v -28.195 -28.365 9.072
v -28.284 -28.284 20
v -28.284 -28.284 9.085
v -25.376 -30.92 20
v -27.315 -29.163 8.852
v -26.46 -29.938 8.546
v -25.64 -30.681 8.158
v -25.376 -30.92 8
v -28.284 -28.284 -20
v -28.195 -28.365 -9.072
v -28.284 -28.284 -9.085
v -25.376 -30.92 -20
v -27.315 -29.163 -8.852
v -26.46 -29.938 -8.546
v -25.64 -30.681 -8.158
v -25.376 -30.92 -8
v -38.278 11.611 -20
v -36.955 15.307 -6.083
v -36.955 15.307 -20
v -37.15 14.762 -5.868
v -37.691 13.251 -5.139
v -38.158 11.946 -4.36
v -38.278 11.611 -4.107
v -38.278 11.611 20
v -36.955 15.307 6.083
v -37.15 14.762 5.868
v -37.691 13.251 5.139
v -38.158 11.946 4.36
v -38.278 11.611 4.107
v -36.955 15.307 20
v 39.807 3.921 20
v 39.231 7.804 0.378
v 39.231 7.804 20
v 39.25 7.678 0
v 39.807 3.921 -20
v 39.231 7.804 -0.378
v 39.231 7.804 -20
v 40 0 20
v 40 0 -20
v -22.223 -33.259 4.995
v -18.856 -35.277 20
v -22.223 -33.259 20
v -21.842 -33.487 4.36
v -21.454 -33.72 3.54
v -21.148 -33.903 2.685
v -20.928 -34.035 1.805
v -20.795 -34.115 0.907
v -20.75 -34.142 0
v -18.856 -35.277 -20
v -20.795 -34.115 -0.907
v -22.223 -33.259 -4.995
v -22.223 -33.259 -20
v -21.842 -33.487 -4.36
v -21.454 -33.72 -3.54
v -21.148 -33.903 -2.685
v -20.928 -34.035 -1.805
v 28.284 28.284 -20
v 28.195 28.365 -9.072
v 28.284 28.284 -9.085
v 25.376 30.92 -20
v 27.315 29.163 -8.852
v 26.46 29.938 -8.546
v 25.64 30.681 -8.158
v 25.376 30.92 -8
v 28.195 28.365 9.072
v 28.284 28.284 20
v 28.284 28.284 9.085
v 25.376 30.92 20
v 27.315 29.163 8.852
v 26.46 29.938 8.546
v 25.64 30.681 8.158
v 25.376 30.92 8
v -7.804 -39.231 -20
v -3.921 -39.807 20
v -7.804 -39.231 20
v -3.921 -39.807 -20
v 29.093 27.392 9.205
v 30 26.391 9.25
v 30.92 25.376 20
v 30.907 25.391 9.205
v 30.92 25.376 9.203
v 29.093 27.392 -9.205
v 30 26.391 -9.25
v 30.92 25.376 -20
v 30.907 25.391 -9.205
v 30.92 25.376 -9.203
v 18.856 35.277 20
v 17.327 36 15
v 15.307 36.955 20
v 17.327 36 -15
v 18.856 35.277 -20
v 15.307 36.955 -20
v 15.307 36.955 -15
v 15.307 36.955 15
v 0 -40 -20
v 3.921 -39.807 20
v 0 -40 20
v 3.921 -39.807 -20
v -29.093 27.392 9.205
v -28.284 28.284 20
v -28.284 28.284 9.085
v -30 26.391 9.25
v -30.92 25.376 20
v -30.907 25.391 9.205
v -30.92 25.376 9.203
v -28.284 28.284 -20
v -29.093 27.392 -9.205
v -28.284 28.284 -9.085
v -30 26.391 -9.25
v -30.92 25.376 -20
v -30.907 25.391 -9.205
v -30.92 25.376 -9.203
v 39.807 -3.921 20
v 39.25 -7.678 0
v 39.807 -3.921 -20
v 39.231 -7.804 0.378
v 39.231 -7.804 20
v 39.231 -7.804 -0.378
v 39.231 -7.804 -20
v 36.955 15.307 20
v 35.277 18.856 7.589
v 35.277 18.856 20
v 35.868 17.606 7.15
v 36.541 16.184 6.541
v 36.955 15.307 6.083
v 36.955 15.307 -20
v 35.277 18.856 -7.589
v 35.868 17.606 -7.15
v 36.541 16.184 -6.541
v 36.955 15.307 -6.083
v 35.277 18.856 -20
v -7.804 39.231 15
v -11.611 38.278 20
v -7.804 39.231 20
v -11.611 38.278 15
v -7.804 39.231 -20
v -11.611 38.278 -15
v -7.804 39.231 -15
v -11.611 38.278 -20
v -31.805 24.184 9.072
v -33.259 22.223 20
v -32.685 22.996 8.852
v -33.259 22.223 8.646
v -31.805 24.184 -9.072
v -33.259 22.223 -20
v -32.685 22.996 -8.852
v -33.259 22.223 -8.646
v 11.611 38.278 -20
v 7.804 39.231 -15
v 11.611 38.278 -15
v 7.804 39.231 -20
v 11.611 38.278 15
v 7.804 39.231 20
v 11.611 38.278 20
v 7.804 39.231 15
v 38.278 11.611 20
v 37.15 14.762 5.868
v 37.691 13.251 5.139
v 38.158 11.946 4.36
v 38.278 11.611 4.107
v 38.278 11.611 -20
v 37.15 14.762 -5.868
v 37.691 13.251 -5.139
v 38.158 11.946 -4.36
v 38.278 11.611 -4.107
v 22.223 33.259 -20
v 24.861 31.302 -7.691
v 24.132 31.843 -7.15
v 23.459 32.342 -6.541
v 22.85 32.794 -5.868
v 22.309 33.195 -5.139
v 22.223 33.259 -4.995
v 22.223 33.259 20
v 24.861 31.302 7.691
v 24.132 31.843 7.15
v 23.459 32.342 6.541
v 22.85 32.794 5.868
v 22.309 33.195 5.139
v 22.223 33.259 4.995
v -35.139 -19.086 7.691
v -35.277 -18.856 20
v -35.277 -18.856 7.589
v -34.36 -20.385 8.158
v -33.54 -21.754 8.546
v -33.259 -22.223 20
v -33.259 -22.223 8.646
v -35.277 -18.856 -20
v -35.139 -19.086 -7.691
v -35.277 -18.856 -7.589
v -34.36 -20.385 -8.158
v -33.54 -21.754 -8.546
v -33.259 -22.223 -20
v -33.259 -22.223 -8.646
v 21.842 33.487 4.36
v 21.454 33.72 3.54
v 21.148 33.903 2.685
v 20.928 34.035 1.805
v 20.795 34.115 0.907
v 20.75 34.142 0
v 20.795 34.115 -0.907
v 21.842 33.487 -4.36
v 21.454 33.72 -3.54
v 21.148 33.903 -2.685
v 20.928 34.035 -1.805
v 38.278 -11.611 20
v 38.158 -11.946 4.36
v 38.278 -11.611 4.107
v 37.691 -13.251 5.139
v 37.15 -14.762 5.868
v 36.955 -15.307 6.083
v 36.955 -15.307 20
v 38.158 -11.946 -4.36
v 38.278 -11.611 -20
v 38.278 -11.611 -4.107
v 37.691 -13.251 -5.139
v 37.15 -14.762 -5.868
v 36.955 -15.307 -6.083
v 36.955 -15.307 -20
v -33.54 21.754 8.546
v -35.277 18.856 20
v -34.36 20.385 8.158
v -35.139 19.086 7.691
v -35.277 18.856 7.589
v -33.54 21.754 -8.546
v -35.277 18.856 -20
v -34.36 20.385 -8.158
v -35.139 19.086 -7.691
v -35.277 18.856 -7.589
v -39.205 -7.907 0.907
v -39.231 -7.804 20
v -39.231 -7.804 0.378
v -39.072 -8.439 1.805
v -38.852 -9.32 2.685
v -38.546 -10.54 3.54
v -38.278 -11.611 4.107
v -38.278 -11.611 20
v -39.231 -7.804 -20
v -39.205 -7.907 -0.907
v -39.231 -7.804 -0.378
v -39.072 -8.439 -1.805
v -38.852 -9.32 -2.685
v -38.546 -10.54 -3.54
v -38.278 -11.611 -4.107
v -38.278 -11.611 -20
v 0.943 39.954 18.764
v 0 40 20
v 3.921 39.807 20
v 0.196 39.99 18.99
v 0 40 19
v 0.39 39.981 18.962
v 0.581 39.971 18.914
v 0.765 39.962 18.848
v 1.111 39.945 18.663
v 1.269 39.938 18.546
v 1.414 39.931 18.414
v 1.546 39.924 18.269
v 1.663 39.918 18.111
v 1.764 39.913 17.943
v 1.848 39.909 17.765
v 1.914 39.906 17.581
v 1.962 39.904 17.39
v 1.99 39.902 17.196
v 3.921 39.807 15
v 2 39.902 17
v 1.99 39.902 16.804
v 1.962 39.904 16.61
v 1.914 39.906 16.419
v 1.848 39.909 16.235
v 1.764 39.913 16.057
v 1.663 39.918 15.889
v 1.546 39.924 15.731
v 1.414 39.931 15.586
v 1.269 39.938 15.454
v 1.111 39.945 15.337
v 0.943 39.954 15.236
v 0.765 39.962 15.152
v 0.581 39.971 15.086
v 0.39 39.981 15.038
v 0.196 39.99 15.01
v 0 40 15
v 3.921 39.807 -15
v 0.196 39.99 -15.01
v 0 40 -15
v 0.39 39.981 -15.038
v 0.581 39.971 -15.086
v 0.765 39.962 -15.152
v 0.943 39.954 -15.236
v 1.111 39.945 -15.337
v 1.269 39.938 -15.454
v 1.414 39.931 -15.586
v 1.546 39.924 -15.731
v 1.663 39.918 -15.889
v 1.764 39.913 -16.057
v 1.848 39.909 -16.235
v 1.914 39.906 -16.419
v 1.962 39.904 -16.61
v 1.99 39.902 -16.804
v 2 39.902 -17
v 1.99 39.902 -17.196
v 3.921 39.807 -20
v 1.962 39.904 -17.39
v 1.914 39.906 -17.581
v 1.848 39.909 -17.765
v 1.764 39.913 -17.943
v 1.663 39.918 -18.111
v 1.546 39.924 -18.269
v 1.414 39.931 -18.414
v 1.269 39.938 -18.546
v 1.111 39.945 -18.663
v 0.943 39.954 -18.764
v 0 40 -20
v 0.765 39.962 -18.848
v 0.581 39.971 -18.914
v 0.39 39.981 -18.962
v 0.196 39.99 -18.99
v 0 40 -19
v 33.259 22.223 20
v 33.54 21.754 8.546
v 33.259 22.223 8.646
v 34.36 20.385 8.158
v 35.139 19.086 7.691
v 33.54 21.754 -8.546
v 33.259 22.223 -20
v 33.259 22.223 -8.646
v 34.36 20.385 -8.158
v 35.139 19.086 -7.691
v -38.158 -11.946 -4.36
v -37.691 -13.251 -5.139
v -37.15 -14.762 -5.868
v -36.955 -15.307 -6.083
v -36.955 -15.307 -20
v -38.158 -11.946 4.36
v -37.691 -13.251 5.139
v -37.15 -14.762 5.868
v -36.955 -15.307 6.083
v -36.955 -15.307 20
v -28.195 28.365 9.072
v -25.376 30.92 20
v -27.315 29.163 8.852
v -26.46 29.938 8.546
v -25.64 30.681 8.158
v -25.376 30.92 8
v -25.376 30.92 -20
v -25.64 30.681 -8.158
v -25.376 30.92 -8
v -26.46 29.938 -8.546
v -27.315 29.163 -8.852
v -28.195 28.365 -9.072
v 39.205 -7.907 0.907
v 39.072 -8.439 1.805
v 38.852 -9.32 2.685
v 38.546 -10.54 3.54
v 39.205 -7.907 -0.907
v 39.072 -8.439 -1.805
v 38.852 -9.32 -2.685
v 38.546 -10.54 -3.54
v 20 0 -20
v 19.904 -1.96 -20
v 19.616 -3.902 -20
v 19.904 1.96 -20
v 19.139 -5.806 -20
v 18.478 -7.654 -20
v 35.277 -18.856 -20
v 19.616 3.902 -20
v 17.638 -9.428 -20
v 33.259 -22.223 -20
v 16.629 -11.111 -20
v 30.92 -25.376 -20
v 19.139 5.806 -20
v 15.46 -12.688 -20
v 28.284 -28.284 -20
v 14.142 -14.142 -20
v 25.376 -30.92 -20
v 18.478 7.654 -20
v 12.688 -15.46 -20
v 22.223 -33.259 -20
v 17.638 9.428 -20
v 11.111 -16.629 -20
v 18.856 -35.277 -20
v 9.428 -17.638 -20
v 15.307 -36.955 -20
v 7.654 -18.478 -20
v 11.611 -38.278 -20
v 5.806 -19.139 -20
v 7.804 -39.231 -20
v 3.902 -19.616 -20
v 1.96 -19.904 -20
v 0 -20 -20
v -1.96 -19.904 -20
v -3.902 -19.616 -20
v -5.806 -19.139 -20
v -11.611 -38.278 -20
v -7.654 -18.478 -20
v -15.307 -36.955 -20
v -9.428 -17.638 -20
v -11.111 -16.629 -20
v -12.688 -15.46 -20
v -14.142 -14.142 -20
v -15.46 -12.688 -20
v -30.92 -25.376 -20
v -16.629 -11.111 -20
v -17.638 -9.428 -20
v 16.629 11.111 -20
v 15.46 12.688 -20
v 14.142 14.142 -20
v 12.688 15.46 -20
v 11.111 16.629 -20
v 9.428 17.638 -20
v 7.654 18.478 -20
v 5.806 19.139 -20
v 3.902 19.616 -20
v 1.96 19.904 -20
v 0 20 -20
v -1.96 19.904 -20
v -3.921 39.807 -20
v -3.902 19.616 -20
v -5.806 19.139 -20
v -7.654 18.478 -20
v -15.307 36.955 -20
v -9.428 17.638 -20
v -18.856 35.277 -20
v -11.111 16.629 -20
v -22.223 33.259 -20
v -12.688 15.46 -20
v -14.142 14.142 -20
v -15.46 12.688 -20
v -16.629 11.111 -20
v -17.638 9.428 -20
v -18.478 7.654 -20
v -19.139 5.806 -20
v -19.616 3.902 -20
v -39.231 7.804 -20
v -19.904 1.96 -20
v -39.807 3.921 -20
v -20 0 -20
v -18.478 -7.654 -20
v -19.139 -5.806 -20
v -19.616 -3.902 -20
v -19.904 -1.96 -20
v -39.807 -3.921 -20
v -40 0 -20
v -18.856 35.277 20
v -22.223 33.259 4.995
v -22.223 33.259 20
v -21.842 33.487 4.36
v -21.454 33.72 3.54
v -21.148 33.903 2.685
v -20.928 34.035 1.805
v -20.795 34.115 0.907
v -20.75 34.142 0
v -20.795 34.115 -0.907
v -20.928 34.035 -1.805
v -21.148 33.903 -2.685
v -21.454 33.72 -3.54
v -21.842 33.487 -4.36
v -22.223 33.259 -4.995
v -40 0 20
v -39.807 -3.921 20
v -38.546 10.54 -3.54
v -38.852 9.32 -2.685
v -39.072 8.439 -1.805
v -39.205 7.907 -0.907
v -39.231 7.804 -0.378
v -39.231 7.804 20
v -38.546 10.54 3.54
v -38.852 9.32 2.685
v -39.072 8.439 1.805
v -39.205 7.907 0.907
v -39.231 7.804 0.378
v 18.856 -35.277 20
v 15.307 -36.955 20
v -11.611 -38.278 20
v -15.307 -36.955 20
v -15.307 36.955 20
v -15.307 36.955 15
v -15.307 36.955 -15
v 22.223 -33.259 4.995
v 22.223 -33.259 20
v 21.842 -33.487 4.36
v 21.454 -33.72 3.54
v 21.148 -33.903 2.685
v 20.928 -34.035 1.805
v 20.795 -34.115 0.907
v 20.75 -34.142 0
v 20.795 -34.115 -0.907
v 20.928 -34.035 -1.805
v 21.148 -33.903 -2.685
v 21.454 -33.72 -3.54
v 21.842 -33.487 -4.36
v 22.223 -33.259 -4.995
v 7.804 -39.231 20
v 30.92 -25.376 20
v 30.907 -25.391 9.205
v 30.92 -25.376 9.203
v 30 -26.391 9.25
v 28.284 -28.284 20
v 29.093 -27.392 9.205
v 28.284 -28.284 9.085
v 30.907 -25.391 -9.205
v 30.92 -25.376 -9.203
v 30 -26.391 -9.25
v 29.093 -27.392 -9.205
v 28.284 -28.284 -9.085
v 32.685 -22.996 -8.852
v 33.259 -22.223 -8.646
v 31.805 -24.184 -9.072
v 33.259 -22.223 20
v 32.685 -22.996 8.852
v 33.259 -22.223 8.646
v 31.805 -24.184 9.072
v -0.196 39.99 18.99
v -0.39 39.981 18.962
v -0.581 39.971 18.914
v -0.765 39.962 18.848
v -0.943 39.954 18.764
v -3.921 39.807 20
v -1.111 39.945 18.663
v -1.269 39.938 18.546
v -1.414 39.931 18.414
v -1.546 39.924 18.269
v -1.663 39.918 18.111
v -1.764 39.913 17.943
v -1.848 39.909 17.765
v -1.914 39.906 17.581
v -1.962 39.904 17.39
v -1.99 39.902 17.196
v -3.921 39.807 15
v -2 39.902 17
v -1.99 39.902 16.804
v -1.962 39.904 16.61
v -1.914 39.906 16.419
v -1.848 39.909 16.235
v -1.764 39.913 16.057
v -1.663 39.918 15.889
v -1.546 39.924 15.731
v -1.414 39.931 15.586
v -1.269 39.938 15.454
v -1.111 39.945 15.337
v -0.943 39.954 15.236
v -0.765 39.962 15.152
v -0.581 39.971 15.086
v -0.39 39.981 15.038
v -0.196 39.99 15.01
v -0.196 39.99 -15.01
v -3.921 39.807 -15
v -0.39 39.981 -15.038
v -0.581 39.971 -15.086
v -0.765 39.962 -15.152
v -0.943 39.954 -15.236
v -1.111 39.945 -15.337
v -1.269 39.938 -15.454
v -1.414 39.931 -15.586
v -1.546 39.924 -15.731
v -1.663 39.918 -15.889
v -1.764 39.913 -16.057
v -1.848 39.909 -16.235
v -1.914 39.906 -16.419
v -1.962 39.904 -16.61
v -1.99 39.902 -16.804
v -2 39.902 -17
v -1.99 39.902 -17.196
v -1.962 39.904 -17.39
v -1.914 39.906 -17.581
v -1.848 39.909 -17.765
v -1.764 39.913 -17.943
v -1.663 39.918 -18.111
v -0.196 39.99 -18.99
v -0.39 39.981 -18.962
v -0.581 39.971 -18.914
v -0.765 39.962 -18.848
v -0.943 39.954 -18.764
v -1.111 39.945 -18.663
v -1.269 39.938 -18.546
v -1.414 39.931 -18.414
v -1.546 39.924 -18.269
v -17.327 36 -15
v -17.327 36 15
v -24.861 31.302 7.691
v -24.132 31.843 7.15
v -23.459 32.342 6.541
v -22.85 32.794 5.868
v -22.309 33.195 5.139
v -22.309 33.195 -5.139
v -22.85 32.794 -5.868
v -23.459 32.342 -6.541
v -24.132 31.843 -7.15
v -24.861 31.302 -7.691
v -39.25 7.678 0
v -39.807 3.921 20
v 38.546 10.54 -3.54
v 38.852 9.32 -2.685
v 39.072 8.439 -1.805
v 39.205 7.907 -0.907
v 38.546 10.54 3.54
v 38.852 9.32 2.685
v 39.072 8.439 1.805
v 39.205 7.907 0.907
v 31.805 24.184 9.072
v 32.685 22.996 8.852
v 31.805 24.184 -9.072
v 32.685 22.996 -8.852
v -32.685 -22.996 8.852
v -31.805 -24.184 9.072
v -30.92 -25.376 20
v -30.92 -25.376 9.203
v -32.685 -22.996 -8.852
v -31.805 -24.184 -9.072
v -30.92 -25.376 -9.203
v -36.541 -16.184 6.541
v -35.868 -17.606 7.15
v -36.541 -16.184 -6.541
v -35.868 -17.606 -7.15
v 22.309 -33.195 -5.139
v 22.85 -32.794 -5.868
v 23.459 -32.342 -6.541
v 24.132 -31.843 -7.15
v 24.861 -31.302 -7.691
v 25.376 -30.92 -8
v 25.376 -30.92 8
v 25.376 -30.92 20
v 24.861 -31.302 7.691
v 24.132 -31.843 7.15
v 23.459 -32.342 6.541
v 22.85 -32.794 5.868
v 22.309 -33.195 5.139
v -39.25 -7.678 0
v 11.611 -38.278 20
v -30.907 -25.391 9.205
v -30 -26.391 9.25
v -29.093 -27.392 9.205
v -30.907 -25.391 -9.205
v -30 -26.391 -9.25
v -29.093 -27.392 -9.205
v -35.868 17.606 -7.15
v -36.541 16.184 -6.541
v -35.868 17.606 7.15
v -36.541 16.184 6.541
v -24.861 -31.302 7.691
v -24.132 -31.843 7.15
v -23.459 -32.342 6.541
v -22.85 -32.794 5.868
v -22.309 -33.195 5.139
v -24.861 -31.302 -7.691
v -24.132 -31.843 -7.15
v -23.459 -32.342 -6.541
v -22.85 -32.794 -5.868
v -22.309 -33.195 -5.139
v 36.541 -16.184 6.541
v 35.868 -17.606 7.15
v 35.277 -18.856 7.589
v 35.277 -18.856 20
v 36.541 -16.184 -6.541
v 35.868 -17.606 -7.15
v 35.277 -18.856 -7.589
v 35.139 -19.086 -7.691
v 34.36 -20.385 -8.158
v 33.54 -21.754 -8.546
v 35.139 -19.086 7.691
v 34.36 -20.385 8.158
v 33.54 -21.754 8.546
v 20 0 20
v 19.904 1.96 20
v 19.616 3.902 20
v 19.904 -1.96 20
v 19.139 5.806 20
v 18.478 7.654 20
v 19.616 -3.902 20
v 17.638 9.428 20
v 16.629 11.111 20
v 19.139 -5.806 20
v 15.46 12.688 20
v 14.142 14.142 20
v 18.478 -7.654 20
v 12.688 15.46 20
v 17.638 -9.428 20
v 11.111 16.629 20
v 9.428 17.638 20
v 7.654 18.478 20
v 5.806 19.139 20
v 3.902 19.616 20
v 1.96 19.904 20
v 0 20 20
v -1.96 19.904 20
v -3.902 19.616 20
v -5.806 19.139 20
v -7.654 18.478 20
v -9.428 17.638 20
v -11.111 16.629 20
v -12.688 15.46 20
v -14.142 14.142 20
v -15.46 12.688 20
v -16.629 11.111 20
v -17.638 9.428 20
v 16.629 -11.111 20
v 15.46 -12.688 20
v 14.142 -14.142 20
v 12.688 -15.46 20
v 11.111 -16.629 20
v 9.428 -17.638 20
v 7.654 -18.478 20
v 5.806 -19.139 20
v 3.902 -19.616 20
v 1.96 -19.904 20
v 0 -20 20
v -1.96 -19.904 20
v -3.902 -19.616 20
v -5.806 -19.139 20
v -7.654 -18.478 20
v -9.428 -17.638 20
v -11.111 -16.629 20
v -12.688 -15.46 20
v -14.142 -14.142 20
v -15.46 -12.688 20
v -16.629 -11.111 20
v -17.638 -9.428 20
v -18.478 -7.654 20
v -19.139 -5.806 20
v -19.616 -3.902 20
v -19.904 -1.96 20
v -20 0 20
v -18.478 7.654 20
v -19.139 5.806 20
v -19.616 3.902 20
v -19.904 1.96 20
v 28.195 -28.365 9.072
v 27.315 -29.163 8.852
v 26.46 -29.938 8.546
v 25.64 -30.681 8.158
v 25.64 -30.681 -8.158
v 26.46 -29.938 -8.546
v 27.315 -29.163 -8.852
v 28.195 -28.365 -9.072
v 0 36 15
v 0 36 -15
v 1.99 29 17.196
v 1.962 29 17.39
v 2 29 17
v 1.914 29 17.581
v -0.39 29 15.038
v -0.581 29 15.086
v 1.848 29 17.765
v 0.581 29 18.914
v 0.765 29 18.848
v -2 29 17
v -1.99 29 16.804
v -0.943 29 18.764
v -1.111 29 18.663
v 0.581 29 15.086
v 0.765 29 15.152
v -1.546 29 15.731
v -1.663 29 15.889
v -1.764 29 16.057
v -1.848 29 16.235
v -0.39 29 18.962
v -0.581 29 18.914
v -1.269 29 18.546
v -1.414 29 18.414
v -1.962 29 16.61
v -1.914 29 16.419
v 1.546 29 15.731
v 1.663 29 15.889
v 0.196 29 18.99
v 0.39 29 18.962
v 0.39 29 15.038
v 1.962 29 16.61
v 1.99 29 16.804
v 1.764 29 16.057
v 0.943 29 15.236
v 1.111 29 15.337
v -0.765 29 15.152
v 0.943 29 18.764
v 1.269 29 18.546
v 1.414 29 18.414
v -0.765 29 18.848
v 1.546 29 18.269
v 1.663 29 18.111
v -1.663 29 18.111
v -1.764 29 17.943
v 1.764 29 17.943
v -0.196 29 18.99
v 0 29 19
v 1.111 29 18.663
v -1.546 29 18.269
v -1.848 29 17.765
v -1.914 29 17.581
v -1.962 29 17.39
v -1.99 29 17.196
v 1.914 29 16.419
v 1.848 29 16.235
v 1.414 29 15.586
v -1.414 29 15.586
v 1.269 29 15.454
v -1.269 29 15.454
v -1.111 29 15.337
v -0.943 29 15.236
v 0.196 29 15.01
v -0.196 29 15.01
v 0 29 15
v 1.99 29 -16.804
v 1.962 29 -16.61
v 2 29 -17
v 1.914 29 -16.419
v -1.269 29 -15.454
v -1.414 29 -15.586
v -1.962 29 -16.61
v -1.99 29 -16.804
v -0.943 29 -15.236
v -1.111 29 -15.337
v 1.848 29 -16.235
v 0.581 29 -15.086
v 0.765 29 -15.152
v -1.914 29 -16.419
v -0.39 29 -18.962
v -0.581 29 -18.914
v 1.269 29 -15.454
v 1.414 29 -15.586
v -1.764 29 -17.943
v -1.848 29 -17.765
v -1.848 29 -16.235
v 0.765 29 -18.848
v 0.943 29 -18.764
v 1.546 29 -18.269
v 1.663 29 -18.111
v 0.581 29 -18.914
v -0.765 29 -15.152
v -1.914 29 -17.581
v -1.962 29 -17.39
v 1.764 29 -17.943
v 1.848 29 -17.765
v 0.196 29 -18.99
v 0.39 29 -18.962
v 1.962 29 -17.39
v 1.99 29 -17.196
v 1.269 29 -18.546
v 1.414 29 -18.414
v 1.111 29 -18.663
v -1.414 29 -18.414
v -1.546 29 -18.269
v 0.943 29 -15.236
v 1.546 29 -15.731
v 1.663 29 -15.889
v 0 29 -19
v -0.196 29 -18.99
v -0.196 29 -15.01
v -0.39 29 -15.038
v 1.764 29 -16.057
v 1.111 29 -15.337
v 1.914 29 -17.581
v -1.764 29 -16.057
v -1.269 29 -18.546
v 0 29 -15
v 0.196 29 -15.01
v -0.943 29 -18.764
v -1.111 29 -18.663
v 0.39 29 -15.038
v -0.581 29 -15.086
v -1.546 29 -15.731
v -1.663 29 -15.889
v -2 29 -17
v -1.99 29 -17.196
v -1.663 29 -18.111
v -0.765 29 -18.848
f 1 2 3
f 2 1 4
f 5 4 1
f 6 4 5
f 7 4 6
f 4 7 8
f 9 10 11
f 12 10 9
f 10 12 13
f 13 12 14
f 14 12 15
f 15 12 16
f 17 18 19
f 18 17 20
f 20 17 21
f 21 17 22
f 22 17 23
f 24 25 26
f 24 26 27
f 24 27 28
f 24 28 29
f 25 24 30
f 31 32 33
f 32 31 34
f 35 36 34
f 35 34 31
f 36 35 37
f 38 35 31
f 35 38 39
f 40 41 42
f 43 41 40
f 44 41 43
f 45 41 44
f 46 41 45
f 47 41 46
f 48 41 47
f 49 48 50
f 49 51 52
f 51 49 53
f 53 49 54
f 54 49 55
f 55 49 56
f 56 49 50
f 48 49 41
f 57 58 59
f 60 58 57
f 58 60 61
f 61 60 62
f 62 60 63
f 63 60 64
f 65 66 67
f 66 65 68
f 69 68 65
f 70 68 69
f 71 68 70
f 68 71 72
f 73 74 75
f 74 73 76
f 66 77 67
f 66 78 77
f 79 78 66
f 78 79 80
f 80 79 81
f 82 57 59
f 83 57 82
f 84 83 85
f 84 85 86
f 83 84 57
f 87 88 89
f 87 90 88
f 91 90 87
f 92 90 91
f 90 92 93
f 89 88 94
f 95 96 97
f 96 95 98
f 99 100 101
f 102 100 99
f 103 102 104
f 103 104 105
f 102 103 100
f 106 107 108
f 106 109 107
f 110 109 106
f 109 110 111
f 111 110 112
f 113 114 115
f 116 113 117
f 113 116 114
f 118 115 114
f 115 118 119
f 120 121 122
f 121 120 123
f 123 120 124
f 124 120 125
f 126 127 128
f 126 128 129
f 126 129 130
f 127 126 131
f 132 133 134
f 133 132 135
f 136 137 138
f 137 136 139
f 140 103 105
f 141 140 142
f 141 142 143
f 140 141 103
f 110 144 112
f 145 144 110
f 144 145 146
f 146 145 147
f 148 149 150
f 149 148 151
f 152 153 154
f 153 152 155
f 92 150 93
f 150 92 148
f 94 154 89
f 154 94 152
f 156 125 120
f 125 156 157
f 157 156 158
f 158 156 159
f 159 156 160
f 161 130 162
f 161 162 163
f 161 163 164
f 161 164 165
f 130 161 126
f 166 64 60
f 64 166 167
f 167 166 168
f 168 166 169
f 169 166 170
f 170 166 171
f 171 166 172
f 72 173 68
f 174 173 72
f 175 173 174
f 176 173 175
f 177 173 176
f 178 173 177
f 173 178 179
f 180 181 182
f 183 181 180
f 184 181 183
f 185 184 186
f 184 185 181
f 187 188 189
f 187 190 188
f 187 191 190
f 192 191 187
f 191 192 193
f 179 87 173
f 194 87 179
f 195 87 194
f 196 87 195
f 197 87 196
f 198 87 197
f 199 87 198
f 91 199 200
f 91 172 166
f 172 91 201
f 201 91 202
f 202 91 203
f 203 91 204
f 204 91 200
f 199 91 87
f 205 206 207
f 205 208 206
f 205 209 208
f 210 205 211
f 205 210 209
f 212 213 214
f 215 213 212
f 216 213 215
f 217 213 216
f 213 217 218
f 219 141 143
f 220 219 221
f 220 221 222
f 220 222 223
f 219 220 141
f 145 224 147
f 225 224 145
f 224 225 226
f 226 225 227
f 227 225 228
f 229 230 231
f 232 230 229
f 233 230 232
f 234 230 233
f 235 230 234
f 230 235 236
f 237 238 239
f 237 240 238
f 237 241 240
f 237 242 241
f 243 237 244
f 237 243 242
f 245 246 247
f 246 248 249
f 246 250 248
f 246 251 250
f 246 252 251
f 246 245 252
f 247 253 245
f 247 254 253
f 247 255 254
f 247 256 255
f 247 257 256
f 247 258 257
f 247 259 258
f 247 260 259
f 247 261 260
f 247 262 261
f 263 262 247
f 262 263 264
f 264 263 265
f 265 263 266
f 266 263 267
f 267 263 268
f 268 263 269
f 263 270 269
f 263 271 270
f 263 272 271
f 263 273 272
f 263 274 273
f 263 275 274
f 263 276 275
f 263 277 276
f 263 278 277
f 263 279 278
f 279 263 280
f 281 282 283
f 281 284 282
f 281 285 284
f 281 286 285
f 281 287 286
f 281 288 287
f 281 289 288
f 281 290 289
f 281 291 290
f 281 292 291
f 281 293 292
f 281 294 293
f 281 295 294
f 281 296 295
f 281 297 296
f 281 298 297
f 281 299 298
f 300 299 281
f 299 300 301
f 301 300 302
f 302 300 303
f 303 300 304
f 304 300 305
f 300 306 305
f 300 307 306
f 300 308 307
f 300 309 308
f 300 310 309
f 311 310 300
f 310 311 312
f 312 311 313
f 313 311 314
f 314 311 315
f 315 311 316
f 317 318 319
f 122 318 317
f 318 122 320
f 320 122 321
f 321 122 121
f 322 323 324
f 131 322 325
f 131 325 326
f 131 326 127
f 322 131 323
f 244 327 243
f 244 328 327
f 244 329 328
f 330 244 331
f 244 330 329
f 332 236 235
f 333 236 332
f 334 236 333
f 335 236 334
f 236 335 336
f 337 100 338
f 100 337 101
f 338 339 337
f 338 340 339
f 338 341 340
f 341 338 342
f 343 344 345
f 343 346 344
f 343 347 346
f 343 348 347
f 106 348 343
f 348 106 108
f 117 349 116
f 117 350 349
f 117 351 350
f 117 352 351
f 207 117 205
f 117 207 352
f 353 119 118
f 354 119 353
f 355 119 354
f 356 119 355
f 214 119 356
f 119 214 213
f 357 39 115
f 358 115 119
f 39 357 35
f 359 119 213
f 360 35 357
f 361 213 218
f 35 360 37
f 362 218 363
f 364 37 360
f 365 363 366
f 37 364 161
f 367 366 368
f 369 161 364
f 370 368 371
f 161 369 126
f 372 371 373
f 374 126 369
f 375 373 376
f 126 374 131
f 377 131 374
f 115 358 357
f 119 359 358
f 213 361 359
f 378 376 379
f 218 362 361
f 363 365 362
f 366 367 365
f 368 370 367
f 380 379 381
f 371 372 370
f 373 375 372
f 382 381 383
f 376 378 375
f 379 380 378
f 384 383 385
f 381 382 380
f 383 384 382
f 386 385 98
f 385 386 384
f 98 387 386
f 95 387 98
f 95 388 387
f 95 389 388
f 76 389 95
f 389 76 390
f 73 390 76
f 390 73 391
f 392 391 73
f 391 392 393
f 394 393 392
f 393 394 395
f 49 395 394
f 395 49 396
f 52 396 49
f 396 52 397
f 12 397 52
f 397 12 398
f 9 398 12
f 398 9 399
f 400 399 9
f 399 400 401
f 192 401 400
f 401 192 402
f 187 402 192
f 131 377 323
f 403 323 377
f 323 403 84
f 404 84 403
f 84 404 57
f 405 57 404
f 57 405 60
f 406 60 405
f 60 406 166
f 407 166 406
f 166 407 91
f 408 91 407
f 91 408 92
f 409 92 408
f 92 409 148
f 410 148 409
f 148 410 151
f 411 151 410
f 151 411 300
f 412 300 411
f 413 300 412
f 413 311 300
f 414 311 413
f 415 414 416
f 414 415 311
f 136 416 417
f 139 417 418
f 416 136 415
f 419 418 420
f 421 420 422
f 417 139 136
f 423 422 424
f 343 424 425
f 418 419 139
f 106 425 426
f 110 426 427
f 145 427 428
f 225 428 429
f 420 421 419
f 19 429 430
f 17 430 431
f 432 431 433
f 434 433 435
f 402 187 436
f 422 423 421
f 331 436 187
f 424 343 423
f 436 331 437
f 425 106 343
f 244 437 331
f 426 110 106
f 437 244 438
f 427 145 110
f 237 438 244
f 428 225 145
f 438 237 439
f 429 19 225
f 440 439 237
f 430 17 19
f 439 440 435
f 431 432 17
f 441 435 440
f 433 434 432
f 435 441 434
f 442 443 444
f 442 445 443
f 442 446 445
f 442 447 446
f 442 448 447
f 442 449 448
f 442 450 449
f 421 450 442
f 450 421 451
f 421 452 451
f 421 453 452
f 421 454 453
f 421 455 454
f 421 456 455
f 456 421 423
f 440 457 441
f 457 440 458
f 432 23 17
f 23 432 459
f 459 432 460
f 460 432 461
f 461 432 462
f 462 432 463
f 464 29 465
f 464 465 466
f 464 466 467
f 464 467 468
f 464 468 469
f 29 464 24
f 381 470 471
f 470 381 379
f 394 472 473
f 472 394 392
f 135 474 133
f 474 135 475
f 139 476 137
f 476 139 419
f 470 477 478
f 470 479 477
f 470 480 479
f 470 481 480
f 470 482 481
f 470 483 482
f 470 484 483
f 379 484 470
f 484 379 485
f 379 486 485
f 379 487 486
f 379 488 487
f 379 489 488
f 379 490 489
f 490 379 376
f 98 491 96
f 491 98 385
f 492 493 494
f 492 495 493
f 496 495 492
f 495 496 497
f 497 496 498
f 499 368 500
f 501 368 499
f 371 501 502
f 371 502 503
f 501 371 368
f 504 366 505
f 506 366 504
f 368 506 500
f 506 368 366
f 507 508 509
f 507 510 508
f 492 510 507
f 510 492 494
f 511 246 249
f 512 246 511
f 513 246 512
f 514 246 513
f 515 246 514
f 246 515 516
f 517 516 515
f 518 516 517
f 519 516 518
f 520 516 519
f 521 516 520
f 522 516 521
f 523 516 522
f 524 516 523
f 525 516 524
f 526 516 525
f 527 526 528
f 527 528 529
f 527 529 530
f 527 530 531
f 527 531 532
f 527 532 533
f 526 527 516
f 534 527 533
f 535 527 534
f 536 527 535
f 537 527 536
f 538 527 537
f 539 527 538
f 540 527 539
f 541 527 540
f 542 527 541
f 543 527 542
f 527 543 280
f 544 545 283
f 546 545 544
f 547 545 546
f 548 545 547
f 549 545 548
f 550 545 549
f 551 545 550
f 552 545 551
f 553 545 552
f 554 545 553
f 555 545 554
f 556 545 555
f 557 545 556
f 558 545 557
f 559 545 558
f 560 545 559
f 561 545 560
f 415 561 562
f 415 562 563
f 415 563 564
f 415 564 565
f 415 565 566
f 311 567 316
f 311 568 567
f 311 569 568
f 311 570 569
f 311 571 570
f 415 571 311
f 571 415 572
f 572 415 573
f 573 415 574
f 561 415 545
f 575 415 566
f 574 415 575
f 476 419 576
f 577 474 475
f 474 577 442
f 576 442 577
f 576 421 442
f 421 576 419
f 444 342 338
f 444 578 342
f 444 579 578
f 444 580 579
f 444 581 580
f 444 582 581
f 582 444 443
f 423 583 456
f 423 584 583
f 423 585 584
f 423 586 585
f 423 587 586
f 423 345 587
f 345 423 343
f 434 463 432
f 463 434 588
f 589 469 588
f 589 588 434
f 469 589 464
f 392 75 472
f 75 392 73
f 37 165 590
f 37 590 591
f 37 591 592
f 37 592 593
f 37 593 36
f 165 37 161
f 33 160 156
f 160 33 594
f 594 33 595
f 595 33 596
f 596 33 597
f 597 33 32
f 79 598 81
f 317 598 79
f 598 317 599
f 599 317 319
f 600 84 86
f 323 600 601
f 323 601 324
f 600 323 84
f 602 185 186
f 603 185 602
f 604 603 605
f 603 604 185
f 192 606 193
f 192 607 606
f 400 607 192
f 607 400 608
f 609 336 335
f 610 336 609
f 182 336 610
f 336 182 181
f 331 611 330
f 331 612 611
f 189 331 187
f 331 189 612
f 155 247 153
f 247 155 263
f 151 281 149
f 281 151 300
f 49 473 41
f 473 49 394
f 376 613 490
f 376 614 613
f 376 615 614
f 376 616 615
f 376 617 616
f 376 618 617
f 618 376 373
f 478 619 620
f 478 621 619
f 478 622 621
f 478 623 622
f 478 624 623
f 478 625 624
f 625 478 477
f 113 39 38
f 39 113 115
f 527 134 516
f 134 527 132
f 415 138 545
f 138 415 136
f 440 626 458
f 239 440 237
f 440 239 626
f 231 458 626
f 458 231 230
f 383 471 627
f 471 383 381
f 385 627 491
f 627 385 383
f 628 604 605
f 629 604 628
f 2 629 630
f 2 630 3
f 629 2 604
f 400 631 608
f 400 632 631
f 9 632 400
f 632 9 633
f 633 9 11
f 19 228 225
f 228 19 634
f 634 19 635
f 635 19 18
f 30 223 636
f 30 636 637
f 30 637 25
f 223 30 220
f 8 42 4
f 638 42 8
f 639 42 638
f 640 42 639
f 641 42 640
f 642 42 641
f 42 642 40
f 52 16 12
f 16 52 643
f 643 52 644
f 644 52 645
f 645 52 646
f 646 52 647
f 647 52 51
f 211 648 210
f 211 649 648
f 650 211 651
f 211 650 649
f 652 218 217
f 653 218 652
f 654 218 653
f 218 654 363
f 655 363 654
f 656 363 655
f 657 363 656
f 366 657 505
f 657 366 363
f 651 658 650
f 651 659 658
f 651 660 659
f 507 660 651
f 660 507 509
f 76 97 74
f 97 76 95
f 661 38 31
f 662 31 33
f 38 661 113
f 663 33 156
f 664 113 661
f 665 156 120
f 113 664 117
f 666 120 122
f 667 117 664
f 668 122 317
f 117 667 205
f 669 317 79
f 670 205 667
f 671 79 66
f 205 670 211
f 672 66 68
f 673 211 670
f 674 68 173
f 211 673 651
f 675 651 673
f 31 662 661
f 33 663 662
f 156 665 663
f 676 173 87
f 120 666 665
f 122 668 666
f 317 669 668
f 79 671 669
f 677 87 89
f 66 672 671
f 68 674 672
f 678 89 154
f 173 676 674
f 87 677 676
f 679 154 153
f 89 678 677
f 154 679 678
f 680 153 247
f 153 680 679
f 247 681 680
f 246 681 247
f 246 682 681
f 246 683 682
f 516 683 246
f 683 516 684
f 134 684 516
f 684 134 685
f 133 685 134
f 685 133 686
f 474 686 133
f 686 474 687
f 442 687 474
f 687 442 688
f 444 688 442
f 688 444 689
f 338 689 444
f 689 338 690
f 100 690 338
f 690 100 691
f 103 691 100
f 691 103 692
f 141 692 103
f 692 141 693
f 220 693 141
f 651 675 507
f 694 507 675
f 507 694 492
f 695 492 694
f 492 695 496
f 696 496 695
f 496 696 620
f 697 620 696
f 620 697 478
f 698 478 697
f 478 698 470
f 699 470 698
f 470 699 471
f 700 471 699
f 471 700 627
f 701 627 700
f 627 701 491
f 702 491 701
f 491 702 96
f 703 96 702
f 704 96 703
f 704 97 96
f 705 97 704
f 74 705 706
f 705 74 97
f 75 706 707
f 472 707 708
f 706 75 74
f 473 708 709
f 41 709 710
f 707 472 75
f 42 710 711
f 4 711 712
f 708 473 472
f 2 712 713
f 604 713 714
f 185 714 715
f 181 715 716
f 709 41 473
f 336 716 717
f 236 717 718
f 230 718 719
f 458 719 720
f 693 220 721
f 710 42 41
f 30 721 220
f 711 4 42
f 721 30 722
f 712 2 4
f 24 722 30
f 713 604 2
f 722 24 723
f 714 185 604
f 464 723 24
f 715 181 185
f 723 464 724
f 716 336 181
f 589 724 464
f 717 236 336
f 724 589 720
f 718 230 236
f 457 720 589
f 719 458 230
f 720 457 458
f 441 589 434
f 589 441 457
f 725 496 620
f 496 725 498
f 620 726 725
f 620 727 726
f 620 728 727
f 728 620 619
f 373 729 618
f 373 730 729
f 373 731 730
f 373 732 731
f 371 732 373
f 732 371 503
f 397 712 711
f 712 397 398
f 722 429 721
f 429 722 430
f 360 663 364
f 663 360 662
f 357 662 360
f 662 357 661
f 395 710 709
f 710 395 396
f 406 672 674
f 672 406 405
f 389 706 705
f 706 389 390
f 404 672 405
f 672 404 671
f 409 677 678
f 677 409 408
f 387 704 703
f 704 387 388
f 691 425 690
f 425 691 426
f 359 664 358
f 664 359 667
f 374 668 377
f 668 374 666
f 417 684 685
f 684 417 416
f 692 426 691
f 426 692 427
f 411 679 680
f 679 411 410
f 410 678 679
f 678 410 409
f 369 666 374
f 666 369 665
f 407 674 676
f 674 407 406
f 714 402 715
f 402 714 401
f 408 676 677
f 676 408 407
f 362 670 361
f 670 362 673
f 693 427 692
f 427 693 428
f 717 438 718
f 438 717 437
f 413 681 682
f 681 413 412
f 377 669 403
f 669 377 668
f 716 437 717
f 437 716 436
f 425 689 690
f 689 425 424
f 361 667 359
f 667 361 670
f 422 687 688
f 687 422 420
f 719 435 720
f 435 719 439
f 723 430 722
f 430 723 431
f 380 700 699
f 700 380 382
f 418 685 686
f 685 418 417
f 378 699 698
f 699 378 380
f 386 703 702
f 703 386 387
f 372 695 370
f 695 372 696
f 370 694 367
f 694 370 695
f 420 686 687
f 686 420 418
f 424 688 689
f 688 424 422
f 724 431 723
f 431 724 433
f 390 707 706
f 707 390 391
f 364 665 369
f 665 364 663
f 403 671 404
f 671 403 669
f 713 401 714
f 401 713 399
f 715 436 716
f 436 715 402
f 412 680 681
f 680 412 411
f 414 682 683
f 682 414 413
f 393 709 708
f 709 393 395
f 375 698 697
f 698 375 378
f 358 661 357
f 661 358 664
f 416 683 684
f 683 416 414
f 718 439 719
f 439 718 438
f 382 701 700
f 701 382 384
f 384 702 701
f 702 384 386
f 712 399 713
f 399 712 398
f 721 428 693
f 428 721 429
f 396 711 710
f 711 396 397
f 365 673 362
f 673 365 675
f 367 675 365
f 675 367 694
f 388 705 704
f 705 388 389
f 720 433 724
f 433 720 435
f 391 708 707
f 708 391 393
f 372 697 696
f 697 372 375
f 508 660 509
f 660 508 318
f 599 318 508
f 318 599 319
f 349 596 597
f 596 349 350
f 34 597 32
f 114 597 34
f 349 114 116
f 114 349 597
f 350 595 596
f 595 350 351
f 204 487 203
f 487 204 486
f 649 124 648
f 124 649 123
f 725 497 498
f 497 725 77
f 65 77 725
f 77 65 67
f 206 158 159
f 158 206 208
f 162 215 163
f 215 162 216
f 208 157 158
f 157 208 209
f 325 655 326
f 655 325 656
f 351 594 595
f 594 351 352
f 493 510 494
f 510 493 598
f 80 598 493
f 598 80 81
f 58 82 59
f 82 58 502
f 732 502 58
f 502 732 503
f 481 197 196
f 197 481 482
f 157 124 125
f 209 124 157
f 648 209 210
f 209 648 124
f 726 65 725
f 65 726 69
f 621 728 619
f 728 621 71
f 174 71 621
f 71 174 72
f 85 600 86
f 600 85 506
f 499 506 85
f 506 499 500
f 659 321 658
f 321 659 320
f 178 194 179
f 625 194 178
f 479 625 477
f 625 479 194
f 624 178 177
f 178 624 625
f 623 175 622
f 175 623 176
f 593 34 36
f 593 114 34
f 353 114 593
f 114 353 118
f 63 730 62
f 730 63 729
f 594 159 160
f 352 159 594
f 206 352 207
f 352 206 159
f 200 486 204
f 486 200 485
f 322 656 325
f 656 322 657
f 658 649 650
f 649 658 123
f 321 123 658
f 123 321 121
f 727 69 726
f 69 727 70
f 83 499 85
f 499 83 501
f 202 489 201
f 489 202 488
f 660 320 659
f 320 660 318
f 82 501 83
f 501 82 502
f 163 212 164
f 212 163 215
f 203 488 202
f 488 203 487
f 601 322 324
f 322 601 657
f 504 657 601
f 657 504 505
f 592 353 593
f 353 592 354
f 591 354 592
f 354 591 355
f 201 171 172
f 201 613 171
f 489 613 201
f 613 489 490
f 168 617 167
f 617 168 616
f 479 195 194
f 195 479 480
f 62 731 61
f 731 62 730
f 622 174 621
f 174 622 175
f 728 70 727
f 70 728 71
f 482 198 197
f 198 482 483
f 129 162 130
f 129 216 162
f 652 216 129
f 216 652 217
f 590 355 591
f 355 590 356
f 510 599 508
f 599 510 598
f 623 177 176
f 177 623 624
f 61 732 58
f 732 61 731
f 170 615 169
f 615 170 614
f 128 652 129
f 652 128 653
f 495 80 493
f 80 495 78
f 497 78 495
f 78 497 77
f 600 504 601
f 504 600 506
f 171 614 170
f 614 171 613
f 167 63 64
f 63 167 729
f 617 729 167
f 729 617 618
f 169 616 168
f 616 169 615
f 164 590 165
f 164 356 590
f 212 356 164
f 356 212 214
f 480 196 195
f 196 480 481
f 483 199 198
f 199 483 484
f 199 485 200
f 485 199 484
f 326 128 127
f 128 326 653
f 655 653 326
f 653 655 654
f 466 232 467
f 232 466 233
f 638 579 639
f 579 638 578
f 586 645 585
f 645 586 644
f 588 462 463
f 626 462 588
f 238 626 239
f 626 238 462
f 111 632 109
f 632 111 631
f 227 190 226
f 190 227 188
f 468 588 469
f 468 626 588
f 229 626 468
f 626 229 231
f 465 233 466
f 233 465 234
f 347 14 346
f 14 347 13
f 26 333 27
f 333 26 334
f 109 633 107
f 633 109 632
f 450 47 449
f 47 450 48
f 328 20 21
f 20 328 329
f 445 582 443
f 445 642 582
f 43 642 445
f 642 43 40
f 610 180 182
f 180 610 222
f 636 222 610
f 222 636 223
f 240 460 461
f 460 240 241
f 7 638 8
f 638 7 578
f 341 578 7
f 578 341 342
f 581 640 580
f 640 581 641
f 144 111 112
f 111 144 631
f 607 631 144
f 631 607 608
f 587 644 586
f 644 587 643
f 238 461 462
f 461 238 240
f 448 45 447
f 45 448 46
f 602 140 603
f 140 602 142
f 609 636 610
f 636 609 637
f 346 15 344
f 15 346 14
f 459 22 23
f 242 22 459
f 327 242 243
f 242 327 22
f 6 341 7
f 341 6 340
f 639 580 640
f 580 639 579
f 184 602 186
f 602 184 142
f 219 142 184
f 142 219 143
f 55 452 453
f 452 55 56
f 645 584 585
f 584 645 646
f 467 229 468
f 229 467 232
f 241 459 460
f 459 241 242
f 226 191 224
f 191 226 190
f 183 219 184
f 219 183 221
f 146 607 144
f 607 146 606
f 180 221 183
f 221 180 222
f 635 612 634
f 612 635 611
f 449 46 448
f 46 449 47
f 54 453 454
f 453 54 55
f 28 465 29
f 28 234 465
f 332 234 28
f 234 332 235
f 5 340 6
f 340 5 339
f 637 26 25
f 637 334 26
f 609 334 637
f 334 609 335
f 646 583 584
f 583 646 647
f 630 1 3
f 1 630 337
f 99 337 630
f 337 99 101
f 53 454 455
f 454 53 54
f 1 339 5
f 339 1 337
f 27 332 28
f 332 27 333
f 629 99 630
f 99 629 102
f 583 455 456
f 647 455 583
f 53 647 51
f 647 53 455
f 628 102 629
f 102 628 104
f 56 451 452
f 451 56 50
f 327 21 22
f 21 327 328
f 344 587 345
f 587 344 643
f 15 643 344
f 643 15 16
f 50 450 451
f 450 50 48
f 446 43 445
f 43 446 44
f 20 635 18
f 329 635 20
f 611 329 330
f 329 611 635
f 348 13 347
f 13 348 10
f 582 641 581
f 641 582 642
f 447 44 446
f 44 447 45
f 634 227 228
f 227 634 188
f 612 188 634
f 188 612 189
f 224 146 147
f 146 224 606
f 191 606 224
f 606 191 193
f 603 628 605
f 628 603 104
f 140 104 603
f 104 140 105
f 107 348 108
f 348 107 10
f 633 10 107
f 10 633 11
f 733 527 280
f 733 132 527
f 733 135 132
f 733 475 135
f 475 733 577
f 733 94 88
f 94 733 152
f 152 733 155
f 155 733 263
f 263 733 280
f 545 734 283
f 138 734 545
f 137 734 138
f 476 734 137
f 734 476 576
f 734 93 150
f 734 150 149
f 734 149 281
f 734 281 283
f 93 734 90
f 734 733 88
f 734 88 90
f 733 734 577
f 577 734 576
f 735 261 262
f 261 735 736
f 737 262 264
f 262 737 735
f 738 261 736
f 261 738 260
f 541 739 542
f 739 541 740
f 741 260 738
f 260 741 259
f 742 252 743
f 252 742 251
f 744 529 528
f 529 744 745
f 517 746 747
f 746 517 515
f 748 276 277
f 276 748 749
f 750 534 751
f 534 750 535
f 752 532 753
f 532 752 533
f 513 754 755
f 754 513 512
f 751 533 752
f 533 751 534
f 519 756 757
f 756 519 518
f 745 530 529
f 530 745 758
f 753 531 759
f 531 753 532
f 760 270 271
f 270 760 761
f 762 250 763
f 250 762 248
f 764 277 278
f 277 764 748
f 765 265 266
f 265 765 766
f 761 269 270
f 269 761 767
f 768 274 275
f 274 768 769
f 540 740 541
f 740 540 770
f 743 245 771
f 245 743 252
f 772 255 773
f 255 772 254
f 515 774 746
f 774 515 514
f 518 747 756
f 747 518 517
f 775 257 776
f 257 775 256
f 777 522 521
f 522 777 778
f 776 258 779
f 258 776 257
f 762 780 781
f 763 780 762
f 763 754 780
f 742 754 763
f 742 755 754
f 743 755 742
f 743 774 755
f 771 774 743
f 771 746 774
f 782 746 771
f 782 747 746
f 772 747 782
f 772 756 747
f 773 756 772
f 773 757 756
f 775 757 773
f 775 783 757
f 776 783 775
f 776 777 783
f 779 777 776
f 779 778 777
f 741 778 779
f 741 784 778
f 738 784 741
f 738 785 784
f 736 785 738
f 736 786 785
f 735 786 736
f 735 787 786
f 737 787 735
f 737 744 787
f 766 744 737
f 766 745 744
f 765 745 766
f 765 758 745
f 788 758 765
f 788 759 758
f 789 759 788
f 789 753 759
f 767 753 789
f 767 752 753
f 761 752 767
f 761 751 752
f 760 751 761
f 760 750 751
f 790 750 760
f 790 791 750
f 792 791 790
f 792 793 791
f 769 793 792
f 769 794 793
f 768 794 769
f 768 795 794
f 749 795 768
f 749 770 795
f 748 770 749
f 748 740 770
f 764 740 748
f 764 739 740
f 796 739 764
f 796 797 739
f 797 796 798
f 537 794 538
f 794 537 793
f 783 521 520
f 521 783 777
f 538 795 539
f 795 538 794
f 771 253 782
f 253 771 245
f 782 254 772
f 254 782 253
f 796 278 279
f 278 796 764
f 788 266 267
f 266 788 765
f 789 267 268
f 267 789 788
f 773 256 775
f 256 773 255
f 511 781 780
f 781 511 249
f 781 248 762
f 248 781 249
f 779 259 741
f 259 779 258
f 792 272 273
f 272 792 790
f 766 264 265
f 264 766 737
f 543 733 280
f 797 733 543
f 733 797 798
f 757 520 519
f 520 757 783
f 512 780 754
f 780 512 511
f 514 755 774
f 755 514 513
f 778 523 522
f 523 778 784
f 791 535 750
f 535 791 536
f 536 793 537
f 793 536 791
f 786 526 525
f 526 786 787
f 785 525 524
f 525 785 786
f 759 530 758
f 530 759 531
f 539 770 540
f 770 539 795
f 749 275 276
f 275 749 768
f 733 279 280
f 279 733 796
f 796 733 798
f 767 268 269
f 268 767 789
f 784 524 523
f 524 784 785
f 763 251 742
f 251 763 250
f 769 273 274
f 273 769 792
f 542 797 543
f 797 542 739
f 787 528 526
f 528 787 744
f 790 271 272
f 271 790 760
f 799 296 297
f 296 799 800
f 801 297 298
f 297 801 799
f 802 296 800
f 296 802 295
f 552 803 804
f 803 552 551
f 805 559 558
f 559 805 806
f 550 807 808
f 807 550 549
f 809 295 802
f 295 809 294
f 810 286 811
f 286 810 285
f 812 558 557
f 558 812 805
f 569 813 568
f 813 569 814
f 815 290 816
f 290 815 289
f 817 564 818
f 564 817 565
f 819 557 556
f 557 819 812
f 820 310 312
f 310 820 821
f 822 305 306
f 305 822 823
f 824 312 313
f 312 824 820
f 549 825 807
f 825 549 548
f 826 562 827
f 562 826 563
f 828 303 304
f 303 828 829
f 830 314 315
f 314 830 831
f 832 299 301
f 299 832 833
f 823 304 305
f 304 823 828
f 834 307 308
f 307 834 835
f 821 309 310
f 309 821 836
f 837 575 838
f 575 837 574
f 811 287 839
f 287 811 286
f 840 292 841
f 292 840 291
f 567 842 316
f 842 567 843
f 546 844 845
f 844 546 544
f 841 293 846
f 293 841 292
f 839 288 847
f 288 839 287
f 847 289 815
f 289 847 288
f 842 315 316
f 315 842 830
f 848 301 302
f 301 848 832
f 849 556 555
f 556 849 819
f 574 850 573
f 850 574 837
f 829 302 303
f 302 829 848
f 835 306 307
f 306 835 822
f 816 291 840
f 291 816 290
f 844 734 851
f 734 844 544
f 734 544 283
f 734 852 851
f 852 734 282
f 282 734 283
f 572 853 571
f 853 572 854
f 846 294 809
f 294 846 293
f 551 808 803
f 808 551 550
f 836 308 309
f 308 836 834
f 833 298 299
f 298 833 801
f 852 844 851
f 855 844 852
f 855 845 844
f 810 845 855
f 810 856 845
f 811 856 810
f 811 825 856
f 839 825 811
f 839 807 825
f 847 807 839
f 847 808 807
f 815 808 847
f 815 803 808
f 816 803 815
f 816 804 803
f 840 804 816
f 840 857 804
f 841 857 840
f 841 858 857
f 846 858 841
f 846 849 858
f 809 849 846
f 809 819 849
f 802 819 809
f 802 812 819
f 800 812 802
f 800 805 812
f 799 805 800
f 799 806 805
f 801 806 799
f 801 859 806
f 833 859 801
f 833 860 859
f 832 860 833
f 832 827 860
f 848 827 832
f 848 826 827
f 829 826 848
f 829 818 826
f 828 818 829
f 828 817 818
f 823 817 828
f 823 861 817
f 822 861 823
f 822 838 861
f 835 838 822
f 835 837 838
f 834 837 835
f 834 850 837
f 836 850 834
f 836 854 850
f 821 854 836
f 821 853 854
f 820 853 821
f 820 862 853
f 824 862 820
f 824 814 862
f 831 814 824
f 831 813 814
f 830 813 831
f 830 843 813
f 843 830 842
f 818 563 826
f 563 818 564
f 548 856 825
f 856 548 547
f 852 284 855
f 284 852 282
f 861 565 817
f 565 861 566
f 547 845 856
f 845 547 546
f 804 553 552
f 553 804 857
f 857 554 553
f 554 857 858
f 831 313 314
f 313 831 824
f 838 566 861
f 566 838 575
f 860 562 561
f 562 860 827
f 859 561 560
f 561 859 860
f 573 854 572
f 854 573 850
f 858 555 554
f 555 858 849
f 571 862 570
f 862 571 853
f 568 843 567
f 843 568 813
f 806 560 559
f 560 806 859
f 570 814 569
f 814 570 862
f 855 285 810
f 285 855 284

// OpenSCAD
// COBRA Vertebra - T12 V18
// Height: 40.0mm, OD: 80.0mm

$fn = 64;

difference() {
    // Outer cylinder
    cylinder(h=40.0, d=80.0, center=true);
    
    // Inner channel
    cylinder(h=42.0, d=40.0, center=true);

    // Battery cavity 1
    rotate([0, 0, 0])
    translate([30.0, 0, 0])
    rotate([90, 0, 0])
    cylinder(h=74.0, d=18.5, center=true);

    // Battery cavity 2
    rotate([0, 0, 180])
    translate([30.0, 0, 0])
    rotate([90, 0, 0])
    cylinder(h=74.0, d=18.5, center=true);

    // Solar panel cavity
    translate([0, 38.0, 0])
    cube([50, 4, 30], center=true);

    // Pivot holes
    translate([0, 40.0, 17.0])
    rotate([90, 0, 0])
    cylinder(h=22.0, d=4, center=true);
    
    translate([0, 40.0, -17.0])
    rotate([90, 0, 0])
    cylinder(h=22.0, d=4, center=true);
}
